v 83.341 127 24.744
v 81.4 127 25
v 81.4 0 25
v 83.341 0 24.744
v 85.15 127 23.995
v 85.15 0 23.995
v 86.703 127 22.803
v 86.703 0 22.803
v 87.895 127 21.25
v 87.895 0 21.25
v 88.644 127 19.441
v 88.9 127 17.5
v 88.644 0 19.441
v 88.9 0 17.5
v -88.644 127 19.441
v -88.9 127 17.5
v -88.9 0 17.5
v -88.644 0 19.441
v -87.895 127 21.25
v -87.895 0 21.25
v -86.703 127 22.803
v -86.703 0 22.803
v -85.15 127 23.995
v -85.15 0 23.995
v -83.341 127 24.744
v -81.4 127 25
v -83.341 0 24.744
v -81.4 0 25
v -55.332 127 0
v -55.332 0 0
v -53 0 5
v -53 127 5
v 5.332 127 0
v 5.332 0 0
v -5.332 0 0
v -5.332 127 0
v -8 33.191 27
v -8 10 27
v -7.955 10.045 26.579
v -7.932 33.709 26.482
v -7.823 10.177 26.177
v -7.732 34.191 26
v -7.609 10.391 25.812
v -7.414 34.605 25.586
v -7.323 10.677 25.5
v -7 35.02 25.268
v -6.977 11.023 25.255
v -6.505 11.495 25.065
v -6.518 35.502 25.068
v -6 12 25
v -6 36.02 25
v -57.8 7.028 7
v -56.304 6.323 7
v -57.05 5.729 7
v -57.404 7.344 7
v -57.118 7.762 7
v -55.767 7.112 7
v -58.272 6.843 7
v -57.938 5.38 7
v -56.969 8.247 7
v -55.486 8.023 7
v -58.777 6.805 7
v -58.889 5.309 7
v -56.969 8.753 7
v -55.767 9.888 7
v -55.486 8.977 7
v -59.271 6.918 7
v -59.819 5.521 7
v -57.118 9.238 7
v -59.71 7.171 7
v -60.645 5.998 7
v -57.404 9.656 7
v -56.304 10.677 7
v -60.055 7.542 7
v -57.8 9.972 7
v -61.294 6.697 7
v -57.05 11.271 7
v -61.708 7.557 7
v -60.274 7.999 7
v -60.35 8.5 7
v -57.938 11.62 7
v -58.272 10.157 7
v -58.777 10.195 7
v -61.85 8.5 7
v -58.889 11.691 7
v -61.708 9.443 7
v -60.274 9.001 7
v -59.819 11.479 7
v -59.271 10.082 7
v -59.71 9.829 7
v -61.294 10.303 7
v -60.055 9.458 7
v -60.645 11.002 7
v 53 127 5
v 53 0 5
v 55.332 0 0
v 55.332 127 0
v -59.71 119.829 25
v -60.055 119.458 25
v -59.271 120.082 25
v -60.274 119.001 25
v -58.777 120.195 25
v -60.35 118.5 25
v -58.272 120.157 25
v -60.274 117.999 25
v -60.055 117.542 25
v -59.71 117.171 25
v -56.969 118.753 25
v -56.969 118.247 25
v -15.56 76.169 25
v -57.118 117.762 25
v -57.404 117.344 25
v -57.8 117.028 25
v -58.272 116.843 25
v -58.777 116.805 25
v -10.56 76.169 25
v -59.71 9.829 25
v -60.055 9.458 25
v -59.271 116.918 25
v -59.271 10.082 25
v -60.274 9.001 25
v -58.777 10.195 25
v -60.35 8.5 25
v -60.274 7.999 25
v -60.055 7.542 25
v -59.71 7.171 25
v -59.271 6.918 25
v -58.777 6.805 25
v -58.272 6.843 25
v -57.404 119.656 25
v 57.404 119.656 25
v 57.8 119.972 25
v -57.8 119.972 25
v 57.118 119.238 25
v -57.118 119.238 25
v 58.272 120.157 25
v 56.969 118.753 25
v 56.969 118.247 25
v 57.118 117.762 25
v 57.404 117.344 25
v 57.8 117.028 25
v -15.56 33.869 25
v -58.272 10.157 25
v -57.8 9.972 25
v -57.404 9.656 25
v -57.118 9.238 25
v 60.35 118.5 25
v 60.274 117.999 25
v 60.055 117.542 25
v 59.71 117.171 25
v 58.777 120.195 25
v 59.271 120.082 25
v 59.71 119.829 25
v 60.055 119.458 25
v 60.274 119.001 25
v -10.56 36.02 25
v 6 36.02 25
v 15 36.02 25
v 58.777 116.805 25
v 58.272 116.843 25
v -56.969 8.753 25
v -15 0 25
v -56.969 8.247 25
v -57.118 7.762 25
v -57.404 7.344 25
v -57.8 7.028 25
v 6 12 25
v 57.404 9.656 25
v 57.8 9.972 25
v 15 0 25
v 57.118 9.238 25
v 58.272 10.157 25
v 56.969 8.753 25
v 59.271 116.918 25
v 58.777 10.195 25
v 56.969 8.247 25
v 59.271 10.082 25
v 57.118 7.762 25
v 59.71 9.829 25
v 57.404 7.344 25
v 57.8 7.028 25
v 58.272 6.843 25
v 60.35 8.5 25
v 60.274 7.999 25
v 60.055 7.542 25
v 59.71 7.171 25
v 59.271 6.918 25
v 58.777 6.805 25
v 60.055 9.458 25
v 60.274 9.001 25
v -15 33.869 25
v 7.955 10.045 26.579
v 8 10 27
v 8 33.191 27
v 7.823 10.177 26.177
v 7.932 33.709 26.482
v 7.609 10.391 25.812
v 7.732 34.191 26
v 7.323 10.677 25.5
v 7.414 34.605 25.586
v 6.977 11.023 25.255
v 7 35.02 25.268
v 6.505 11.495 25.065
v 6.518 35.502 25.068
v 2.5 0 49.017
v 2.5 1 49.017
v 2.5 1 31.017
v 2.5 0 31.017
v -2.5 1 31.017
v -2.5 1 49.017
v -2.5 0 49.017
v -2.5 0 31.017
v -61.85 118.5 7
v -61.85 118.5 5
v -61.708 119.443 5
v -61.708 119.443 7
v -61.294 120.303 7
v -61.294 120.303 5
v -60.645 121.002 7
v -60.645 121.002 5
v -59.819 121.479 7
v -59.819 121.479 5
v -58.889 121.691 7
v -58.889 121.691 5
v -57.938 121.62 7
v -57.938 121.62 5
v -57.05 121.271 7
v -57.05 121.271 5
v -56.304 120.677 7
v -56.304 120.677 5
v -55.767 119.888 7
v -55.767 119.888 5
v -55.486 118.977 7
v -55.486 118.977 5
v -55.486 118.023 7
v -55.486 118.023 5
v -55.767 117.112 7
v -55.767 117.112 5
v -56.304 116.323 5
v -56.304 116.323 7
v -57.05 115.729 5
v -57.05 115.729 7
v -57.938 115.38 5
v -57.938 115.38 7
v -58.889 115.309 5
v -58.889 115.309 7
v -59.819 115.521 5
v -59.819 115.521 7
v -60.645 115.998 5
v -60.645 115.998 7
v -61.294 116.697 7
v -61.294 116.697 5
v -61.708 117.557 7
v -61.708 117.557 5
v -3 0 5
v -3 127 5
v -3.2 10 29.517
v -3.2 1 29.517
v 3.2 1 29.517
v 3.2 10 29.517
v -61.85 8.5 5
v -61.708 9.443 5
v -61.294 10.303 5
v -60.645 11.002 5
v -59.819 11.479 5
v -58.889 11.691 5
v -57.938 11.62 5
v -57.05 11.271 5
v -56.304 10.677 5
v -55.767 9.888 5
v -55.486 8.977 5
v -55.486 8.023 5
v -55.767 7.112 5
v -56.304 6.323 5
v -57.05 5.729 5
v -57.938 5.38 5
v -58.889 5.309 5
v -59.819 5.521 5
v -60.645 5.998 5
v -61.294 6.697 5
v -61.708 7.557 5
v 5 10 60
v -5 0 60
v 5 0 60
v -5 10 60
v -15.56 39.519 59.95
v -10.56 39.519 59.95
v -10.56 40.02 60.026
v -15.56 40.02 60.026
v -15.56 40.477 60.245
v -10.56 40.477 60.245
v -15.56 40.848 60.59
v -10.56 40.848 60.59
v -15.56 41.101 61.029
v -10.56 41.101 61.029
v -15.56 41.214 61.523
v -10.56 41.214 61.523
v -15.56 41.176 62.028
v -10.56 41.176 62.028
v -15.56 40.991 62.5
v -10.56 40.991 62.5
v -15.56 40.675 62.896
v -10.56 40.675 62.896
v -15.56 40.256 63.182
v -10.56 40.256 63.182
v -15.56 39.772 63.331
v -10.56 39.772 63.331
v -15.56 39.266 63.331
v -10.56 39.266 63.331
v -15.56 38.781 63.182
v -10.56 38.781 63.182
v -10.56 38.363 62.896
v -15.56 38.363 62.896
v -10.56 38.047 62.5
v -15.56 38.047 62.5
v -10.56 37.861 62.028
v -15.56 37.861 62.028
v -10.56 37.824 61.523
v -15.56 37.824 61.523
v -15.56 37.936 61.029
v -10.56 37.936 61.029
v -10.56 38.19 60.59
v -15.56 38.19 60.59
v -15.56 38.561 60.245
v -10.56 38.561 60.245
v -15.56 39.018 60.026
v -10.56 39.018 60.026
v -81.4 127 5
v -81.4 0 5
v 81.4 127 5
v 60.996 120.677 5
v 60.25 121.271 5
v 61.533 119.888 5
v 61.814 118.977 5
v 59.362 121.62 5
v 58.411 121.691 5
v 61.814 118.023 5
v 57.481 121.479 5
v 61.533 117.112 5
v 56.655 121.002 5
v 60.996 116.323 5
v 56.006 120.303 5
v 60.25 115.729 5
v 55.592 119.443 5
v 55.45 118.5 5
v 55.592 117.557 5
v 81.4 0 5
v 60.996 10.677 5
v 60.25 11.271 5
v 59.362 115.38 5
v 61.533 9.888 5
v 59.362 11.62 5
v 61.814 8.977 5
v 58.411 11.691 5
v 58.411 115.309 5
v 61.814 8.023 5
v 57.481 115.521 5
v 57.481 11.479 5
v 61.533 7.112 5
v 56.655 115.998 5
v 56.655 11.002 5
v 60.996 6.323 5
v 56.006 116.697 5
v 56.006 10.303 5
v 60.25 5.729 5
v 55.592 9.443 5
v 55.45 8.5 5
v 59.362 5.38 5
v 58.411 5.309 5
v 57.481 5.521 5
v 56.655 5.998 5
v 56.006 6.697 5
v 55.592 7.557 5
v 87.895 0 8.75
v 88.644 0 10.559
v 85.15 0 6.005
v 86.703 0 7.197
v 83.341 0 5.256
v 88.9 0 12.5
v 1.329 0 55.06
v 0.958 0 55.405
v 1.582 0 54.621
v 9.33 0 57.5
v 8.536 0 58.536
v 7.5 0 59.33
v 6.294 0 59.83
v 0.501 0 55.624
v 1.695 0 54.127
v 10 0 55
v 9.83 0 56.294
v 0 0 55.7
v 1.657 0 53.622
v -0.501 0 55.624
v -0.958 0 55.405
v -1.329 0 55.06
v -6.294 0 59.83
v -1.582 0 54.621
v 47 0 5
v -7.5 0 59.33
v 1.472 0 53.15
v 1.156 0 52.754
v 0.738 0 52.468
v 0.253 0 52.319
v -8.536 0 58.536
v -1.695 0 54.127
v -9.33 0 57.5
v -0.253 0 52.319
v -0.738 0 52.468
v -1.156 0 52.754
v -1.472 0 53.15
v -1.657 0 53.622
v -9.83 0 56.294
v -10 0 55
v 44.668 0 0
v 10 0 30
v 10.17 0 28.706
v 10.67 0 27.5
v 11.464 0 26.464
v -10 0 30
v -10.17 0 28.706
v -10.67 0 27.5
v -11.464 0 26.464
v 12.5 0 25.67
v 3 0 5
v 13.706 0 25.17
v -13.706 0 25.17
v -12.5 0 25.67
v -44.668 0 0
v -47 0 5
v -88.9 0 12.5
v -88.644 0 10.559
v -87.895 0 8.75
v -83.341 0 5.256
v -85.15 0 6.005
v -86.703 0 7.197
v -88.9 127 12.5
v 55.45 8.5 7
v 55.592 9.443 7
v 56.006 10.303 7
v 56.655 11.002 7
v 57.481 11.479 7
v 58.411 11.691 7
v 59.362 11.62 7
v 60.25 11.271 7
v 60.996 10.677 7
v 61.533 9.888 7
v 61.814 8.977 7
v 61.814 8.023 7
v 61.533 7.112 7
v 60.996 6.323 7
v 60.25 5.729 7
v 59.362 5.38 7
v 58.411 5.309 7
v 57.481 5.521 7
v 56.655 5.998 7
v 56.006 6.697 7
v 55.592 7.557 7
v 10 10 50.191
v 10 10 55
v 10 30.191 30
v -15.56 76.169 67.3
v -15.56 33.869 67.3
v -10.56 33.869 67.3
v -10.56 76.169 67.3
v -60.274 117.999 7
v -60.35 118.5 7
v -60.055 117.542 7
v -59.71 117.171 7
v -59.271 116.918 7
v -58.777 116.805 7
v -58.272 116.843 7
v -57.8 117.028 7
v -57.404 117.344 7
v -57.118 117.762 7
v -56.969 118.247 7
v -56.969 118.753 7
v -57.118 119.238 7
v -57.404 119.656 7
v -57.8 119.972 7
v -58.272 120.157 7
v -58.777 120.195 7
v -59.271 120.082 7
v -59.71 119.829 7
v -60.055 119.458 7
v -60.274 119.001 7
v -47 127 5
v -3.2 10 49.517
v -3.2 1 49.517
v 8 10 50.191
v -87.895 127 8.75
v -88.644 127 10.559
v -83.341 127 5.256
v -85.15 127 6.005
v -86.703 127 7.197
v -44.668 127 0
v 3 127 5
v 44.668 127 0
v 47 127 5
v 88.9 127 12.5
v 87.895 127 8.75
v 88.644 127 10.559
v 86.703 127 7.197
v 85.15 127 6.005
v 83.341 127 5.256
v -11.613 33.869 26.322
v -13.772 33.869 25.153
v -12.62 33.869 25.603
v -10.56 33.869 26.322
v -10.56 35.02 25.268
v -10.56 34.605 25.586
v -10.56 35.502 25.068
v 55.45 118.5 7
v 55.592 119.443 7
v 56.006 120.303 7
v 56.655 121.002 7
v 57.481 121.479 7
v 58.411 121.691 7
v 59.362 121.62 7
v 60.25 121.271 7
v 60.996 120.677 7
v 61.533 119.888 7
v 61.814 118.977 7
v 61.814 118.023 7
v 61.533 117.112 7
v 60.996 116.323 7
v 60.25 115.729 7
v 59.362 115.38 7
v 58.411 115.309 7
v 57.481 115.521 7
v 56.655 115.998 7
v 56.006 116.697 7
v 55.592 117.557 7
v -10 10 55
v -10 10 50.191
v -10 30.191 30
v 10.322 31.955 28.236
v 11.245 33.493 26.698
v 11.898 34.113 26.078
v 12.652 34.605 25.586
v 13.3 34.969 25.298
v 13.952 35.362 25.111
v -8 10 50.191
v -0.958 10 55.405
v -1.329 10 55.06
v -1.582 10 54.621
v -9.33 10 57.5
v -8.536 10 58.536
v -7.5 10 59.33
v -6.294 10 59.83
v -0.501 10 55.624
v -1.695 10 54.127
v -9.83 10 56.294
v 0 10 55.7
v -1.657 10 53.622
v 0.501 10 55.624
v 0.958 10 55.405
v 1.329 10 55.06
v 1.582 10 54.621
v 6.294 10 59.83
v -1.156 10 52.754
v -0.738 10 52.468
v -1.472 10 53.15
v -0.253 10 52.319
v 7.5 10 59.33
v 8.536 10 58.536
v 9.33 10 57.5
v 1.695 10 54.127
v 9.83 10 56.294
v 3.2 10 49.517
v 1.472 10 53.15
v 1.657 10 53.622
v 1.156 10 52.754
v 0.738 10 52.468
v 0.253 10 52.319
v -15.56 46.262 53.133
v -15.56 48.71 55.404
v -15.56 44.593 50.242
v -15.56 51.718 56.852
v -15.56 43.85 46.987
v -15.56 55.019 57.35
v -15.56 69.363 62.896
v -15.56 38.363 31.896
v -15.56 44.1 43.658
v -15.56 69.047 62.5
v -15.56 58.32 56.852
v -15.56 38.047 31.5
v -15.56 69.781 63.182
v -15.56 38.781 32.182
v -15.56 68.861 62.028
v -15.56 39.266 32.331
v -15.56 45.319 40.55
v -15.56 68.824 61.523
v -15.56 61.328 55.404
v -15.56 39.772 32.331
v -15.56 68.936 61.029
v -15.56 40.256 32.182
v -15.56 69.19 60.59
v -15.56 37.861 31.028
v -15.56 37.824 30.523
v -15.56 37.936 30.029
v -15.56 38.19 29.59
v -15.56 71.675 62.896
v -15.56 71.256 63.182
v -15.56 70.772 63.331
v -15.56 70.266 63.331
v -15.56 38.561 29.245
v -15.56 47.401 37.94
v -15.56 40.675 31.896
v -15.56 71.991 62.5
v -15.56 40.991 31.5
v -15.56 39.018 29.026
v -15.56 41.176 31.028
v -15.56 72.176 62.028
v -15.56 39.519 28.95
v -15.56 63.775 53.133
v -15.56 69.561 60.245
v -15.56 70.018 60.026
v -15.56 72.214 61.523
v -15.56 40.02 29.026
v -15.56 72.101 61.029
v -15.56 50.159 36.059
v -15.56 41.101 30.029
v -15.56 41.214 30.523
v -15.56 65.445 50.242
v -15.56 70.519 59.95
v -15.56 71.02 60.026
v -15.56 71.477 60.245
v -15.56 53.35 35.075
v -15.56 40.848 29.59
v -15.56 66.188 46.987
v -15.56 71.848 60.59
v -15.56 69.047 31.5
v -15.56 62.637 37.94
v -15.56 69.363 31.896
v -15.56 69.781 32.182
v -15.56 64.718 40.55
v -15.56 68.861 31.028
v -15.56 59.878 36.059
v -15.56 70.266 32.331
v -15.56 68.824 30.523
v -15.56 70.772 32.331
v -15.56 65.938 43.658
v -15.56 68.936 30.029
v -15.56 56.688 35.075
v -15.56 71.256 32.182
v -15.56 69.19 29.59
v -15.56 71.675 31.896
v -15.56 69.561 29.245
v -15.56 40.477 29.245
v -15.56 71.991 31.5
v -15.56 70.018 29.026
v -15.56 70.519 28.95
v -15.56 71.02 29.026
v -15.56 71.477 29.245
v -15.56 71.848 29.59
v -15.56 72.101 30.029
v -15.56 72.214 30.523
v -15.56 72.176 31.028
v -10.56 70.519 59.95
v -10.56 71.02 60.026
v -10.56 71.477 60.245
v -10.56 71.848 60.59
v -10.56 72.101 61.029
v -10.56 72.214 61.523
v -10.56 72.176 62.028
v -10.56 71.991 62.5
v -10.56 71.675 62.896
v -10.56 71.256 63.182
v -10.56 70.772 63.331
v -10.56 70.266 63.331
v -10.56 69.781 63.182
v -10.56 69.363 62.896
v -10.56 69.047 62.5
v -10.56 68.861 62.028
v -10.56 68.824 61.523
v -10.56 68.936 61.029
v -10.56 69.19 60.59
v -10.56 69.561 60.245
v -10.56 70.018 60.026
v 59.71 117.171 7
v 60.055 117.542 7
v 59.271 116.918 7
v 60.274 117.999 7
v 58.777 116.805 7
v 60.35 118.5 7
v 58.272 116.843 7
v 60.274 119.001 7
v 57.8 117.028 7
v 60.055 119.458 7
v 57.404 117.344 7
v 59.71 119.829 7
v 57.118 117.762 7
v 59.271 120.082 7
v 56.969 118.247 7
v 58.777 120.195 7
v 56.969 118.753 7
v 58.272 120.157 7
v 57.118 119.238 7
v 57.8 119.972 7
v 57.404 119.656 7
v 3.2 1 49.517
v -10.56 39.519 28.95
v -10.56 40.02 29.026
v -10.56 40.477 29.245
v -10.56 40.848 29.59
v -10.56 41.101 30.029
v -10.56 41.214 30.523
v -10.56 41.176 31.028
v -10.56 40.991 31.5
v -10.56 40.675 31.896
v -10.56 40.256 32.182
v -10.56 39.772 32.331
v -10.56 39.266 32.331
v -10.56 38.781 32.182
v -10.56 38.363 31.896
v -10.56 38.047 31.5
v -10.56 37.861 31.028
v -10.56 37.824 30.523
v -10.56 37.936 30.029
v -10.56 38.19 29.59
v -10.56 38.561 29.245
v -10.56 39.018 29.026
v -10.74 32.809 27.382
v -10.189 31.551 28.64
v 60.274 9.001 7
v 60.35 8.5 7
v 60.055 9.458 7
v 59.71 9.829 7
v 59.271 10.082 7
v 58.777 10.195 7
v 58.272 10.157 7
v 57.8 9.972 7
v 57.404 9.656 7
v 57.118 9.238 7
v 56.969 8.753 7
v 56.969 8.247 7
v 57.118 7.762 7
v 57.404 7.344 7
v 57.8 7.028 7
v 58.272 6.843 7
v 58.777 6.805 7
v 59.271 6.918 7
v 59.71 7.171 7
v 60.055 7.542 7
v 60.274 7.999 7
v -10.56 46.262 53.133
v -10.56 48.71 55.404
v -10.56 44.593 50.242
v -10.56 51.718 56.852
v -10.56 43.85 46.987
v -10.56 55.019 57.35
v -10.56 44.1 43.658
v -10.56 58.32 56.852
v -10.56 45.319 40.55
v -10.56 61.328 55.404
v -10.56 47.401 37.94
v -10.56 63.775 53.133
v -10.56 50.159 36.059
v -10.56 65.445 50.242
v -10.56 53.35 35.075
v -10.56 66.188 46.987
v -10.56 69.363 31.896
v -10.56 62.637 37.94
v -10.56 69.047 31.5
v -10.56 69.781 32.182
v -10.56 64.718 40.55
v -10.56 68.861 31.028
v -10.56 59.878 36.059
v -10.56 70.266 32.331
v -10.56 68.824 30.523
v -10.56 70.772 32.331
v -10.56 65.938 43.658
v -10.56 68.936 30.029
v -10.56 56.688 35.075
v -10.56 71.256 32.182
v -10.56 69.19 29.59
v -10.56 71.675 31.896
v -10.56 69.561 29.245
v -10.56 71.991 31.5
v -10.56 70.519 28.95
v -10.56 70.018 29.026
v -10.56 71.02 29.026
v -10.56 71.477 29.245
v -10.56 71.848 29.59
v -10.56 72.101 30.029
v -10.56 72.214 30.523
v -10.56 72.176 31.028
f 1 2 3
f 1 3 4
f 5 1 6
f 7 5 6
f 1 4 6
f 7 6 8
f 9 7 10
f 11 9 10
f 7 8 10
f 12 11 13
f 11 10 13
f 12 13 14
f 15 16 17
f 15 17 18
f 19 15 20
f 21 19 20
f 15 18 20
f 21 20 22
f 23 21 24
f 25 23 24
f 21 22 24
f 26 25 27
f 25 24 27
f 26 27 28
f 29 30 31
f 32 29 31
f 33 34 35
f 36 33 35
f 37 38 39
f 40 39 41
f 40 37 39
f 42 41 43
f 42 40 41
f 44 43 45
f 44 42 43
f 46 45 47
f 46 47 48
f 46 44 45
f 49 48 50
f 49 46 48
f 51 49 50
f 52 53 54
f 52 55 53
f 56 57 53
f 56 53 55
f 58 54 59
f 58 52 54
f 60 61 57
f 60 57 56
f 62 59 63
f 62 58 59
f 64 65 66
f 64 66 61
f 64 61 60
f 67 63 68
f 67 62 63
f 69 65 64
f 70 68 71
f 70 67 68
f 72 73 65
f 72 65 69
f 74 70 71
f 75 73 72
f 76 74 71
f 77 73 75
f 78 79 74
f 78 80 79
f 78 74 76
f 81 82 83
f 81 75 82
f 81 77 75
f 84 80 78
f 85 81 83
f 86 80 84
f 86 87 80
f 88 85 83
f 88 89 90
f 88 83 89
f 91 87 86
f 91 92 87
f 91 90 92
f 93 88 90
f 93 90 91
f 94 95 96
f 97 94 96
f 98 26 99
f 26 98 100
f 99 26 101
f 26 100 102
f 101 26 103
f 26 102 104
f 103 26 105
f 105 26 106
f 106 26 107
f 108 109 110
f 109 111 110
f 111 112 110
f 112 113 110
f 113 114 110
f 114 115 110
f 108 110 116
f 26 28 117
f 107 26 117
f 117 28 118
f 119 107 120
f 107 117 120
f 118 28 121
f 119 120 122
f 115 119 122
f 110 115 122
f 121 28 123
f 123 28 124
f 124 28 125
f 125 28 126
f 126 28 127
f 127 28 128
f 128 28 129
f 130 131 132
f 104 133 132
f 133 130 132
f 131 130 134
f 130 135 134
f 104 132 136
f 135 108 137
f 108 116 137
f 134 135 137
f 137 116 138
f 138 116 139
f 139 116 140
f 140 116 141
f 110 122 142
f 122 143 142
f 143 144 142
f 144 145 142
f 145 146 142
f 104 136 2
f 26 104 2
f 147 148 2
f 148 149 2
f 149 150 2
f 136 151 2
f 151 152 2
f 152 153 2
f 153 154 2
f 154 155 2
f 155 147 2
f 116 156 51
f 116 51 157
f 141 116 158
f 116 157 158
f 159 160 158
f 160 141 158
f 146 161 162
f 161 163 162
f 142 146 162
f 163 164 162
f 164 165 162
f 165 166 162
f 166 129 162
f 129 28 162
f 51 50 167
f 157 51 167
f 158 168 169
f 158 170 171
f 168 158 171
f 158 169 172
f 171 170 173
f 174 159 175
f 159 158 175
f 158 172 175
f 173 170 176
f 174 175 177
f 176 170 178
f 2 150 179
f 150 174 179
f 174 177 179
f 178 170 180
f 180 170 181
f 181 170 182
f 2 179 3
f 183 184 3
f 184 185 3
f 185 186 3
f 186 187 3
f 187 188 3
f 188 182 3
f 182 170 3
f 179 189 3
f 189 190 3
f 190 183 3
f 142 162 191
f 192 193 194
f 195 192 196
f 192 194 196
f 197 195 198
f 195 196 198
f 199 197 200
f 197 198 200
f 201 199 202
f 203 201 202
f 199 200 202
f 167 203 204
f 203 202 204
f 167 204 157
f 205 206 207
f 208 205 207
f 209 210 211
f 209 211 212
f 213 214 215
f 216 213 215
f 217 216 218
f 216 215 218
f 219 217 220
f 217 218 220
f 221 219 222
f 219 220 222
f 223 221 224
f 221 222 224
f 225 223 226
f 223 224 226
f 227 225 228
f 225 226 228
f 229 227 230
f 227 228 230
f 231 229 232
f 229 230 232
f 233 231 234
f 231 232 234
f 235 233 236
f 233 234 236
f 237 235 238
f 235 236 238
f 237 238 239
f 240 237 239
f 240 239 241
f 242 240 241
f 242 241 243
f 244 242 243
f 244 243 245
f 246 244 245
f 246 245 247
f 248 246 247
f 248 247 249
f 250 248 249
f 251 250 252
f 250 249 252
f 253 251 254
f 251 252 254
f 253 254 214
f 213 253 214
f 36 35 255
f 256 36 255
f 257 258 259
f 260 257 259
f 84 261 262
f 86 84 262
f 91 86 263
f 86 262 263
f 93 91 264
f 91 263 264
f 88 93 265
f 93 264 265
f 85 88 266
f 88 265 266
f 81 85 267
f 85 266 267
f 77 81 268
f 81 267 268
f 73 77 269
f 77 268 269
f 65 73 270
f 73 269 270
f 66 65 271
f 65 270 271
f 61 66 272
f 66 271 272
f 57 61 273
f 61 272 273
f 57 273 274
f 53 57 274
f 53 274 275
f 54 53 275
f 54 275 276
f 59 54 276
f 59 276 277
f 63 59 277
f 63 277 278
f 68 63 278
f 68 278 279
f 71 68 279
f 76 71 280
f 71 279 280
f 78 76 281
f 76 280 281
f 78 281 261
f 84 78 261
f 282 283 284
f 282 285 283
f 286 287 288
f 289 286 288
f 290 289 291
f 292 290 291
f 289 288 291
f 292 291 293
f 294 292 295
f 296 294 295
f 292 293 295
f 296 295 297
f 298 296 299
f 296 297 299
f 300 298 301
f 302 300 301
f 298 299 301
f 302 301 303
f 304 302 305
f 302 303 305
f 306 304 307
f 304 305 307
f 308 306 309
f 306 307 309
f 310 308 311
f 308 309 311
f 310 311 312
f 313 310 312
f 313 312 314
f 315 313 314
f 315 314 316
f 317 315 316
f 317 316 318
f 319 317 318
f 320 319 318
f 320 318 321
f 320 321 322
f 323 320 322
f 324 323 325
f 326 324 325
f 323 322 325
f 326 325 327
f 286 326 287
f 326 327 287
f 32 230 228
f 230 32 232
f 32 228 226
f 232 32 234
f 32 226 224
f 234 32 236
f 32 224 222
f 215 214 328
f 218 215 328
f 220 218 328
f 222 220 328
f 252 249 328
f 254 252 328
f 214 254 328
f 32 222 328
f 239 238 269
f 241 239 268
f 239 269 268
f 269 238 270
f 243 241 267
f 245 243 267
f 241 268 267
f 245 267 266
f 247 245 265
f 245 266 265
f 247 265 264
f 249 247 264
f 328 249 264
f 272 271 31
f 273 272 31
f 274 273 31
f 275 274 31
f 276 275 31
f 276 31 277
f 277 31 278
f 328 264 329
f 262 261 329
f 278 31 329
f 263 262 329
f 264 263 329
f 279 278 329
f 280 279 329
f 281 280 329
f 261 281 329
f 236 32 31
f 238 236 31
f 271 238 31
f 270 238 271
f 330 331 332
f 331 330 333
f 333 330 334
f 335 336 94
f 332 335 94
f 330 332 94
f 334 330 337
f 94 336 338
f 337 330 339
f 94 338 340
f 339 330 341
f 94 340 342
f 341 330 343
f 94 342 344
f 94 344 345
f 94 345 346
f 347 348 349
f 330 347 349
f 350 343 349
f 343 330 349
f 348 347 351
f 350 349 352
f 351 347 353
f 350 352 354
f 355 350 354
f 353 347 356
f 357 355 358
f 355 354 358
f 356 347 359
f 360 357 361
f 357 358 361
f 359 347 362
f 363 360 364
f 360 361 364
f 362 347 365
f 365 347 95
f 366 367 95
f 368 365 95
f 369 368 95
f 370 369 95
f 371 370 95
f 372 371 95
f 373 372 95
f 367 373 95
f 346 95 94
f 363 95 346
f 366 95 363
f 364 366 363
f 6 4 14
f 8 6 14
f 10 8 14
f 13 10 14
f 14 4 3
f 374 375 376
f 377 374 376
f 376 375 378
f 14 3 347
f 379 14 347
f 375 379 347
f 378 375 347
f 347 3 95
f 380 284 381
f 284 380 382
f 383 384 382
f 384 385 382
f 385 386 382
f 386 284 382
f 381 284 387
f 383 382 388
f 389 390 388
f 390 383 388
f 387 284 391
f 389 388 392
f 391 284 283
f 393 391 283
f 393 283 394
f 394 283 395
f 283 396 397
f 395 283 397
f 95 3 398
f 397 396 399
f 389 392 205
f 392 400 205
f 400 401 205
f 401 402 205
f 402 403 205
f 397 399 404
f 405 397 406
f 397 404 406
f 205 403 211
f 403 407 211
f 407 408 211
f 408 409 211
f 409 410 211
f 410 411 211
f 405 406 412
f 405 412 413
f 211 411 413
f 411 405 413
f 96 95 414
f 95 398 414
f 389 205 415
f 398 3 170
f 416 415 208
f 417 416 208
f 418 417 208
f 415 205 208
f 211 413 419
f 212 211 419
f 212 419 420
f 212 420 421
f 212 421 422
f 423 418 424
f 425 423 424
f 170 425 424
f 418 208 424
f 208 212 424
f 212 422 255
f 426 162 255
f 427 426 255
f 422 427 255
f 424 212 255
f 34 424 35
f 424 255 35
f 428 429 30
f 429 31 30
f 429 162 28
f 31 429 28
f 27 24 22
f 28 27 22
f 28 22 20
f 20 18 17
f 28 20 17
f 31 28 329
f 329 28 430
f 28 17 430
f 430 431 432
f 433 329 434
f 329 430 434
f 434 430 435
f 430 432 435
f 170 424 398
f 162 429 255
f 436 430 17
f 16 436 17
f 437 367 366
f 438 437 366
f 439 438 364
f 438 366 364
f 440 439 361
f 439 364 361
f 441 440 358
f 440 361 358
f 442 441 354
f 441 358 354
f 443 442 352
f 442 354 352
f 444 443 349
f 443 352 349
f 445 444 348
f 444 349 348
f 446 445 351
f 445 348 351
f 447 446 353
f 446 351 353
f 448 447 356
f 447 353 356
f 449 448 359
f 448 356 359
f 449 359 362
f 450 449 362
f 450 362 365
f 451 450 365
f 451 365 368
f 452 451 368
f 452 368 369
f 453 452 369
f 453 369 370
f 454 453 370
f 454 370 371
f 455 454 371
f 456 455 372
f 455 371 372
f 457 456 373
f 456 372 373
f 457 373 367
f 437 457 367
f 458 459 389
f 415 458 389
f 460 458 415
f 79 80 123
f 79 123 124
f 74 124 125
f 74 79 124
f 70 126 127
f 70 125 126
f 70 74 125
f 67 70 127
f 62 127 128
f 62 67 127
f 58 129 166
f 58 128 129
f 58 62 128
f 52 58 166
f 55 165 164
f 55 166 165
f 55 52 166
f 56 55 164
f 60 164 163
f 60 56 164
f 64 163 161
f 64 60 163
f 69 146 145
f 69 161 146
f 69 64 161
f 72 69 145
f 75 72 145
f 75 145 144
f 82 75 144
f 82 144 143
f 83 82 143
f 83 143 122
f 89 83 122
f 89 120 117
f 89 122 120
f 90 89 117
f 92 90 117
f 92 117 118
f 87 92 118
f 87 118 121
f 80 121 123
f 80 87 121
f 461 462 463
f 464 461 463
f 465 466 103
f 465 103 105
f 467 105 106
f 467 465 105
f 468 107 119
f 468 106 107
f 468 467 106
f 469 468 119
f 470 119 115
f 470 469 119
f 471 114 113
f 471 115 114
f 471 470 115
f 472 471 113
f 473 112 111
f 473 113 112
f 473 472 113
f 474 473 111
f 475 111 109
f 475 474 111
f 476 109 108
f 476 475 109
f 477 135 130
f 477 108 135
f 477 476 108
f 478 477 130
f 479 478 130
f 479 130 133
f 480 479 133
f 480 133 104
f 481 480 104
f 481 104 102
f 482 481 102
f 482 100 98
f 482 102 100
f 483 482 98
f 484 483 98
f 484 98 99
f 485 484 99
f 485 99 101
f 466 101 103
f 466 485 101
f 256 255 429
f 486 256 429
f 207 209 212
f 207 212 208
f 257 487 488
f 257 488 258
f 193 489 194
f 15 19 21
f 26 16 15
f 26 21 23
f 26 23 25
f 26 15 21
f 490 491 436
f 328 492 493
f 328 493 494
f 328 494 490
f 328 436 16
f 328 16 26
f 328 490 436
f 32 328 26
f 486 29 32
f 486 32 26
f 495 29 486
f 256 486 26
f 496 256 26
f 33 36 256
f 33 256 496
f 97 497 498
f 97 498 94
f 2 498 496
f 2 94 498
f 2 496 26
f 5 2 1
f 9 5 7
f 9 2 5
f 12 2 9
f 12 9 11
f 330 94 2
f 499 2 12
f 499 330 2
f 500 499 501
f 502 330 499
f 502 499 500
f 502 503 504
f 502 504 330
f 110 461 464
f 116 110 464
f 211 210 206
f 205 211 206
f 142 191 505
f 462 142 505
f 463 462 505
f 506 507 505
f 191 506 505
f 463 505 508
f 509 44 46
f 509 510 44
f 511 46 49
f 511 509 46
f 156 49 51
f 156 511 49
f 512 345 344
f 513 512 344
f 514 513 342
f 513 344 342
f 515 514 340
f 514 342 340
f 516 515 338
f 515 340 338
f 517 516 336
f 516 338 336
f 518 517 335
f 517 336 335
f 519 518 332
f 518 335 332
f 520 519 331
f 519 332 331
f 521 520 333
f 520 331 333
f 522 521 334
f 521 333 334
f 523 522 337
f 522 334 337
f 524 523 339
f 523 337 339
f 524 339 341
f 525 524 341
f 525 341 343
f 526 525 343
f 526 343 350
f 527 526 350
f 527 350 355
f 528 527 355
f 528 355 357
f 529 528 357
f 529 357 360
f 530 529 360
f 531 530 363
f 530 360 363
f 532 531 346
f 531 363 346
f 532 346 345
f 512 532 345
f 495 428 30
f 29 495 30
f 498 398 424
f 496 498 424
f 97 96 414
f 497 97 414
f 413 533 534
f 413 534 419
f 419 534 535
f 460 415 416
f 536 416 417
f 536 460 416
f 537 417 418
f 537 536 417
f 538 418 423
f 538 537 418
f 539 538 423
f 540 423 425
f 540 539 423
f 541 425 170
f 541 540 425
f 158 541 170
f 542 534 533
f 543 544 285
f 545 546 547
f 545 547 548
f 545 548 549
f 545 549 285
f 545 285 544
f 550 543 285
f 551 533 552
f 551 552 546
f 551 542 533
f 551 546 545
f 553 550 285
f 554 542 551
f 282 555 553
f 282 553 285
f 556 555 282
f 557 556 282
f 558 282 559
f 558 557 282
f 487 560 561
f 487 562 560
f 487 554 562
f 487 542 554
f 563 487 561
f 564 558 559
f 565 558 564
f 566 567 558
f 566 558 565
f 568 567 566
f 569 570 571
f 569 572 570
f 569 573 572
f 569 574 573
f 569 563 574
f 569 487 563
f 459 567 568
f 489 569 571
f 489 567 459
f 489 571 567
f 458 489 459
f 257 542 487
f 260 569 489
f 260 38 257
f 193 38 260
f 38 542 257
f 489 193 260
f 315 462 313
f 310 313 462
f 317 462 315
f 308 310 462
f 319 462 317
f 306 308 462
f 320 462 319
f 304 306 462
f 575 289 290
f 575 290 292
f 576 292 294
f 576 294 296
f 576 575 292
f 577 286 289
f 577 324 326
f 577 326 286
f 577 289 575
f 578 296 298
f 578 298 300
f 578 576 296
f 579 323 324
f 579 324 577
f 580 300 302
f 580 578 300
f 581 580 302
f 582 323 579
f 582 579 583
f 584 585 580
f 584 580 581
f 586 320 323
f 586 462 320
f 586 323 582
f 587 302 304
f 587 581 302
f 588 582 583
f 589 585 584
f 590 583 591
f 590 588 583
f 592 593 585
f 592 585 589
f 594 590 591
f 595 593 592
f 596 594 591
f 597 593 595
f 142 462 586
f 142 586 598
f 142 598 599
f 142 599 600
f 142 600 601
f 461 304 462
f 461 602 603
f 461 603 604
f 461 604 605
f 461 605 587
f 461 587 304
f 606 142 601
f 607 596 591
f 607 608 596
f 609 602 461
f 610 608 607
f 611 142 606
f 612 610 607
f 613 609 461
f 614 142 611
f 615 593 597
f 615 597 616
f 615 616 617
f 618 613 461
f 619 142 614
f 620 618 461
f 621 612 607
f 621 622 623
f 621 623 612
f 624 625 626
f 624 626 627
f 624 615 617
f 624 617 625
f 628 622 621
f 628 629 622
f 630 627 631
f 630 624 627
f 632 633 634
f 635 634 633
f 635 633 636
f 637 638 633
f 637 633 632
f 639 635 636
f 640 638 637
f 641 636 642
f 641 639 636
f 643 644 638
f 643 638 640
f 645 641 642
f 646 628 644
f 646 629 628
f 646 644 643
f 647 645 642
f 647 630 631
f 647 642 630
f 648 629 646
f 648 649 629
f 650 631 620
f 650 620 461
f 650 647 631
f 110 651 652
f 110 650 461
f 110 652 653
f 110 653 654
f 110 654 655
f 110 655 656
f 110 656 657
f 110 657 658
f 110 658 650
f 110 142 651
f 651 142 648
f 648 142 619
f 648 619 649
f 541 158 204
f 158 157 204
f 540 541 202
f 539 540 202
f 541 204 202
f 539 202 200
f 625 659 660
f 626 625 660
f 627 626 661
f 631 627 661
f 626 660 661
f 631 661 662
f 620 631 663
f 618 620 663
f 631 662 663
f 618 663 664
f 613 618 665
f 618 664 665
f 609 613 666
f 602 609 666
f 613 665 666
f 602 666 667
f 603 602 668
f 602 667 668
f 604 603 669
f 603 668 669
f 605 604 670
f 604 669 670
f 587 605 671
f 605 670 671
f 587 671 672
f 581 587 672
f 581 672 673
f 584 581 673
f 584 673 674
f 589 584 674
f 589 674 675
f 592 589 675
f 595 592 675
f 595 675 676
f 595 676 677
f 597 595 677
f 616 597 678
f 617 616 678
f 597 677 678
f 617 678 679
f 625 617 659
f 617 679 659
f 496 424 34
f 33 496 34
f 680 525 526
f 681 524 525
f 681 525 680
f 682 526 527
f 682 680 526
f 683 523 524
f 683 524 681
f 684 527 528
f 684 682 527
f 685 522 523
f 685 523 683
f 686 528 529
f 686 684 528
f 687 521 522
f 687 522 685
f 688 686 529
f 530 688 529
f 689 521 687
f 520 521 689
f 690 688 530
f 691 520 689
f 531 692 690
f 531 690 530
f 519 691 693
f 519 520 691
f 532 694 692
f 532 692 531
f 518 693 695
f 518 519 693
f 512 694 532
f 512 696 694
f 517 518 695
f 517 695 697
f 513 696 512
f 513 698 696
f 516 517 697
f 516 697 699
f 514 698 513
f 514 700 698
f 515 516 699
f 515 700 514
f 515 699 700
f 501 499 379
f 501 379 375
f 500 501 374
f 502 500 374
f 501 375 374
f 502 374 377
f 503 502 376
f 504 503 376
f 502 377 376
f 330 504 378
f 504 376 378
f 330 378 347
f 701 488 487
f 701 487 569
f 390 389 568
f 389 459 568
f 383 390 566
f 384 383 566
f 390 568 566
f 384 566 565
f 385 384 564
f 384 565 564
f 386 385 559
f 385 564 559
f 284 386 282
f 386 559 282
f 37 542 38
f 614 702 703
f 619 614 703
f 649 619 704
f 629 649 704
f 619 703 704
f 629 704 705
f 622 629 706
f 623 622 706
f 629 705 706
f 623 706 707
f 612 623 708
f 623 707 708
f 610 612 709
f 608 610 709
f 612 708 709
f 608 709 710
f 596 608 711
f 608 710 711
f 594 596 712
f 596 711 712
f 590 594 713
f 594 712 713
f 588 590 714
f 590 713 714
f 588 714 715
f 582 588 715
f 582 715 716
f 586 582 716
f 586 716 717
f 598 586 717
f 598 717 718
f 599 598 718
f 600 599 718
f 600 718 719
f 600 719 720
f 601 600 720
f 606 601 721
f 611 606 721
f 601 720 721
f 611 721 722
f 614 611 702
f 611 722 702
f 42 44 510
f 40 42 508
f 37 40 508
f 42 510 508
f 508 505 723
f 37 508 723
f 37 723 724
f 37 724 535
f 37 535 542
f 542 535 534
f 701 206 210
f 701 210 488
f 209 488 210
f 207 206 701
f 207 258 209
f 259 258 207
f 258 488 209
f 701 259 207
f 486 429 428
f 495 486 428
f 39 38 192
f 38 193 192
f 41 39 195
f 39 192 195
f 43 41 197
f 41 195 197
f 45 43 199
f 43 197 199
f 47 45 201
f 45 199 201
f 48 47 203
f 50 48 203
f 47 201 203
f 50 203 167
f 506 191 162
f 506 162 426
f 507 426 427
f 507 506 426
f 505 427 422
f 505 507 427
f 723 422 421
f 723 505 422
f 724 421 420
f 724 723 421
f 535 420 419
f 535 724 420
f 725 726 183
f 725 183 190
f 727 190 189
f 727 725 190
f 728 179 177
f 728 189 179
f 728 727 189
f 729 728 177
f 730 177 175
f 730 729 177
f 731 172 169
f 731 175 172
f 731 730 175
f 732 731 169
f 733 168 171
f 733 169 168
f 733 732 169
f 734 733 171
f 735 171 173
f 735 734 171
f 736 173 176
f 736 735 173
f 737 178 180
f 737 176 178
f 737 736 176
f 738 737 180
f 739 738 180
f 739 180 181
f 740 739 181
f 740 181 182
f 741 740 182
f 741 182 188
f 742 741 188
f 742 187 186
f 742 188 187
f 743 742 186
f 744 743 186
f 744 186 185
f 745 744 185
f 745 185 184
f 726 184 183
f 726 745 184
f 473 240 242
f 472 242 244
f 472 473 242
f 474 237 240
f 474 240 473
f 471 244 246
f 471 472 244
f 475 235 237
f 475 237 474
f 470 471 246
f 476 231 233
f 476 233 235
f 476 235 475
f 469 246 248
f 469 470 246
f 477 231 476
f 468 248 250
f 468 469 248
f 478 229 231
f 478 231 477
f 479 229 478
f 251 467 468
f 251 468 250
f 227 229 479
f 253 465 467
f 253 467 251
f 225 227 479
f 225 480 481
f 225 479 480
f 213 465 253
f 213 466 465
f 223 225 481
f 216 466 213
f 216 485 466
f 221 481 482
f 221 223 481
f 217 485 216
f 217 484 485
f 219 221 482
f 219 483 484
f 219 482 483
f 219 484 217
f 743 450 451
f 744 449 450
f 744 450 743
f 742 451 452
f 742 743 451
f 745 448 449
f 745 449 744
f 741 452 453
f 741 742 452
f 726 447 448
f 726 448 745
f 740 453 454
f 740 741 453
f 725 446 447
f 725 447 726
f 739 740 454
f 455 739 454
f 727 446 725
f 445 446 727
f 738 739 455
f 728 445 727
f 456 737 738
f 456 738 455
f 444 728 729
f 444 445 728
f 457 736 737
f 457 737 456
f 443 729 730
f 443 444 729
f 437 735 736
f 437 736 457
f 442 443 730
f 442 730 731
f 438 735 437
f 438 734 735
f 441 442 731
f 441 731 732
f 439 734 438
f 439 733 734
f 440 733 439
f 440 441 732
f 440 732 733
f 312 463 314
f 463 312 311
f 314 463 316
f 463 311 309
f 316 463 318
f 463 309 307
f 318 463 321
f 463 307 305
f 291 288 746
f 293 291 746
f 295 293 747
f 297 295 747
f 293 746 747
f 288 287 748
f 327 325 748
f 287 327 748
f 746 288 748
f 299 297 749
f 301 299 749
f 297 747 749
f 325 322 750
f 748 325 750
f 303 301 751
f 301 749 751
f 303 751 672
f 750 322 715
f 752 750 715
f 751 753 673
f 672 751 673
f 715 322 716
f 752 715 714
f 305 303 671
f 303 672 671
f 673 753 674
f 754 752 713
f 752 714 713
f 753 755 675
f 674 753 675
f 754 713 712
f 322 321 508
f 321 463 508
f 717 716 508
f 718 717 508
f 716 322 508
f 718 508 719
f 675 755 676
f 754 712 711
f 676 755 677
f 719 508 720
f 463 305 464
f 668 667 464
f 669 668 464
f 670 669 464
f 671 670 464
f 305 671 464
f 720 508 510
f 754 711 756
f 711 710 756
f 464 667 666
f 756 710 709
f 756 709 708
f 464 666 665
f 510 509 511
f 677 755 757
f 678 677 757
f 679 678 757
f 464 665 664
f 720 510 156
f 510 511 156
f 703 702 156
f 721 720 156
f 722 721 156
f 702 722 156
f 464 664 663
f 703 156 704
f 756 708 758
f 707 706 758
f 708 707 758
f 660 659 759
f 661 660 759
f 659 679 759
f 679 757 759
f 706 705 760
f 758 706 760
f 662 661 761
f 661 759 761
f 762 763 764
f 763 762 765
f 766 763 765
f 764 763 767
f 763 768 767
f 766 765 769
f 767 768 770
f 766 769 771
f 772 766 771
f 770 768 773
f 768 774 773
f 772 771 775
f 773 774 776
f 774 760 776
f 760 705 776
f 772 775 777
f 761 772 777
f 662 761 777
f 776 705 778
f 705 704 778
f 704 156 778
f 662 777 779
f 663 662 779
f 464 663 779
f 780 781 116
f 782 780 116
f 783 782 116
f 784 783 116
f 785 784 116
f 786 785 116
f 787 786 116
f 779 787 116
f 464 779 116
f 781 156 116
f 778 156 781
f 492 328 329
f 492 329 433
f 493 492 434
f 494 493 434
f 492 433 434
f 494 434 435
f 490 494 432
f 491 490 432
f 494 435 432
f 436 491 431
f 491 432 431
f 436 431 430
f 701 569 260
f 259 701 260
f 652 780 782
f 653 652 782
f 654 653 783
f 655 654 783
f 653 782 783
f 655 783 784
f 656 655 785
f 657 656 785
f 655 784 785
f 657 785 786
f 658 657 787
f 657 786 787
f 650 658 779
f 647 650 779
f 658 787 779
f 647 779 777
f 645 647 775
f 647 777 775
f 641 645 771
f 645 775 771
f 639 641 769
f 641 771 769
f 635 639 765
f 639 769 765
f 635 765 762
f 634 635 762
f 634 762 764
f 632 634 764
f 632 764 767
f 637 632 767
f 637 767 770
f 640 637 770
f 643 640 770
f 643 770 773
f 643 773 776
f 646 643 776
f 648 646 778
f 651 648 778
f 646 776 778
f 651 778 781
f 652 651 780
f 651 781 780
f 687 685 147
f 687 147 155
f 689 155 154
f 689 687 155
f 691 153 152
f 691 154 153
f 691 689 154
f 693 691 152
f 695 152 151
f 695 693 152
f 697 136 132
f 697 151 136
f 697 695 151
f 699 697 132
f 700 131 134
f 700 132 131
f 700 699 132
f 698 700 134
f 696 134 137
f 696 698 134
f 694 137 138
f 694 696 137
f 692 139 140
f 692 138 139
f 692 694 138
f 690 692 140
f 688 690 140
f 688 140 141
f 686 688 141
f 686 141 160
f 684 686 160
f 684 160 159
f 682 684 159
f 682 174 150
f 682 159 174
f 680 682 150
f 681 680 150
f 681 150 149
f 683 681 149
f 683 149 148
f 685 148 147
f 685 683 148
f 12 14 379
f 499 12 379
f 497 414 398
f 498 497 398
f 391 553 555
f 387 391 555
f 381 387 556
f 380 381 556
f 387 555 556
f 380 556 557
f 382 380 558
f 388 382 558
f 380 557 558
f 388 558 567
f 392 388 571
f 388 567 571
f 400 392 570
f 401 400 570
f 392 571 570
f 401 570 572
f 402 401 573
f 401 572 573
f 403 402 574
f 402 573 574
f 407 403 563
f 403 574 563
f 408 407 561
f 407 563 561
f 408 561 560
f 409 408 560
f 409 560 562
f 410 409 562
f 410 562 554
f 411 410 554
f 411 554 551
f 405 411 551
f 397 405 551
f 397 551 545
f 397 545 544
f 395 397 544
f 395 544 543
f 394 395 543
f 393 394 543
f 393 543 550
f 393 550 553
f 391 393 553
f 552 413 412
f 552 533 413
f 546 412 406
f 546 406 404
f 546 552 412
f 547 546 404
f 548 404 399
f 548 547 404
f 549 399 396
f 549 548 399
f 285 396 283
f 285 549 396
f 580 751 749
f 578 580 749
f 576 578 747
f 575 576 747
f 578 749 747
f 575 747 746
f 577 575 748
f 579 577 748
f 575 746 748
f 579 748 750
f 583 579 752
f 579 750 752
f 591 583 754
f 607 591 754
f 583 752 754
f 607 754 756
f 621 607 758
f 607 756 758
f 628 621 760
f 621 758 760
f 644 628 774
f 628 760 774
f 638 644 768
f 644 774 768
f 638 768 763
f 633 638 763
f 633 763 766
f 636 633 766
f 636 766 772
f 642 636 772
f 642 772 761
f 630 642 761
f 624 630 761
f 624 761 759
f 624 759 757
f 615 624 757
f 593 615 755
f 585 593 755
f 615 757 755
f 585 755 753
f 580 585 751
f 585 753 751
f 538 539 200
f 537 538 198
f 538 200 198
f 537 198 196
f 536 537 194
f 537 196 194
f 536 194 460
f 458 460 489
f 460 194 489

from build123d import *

# Parameters (mm, degrees)
BOSS_EXTRUDE1_DEPTH     = 127
SKETCH3_W               = 5
SKETCH3_H               = 42.3
BOSS_EXTRUDE2_DEPTH     = 42.3
SKETCH4_R               = 1.7
CUT_EXTRUDE1_DEPTH      = 5
CUT_EXTRUDE7_DEPTH      = 161.690696682
CUT_EXTRUDE7_DEPTH_BACK = 161.690696682
SKETCH5_R               = 1.7
SKETCH8_R               = 3.2
CUT_EXTRUDE8_DEPTH      = 2
SKETCH10_W              = 20
SKETCH10_H              = 10
BOSS_EXTRUDE3_DEPTH     = 35
FILLET3_R               = 5
SKETCH12_R              = 1.7
CUT_EXTRUDE9_DEPTH      = 35
RIB47_START             = -2
RIB47_DEPTH             = 2
FILLET7_R               = 5
FILLET8_R               = 2
SKETCH18_W              = 6.4
SKETCH18_H              = 20
CUT_EXTRUDE10_DEPTH     = 9
SKETCH19_W              = 5
SKETCH19_H              = 18
CUT_EXTRUDE11_DEPTH     = 4


# Read off the part's stored shape, not the designer's step: Rib47
with BuildPart() as part:
    # Sketch2 → Boss-Extrude1 (new body)
    with BuildSketch(Plane(origin=(0, 0, 0), x_dir=(1, 0, 0), z_dir=(0, 1, 0))):
        with BuildLine():
            Line((-5.331538291, 0), (-3, -5))
            Line((-3, -5), (-47, -5))
            Line((-47, -5), (-44.668461709, 0))
            Line((-44.668461709, 0), (-55.331538291, 0))
            Line((-55.331538291, 0), (-53, -5))
            Line((-53, -5), (-81.4, -5))
            ThreePointArc((-81.4, -5), (-86.703300859, -7.196699141), (-88.9, -12.5))
            Line((-88.9, -12.5), (-88.9, -17.5))
            ThreePointArc((-88.9, -17.5), (-86.703300859, -22.803300859), (-81.4, -25))
            Line((-81.4, -25), (81.4, -25))
            ThreePointArc((81.4, -25), (86.703300859, -22.803300859), (88.9, -17.5))
            Line((88.9, -17.5), (88.9, -12.5))
            ThreePointArc((88.9, -12.5), (86.703300859, -7.196699141), (81.4, -5))
            Line((81.4, -5), (53, -5))
            Line((53, -5), (55.331538291, 0))
            Line((55.331538291, 0), (44.668461709, 0))
            Line((44.668461709, 0), (47, -5))
            Line((47, -5), (3, -5))
            Line((3, -5), (5.331538291, 0))
            Line((5.331538291, 0), (-5.331538291, 0))
        make_face()
    extrude(amount=BOSS_EXTRUDE1_DEPTH)

    # Sketch3 → Boss-Extrude2 (add)
    with BuildSketch(Plane.XY.offset(25)):
        with Locations((-13.06, 55.018873206)):
            Rectangle(SKETCH3_W, SKETCH3_H)
    extrude(amount=BOSS_EXTRUDE2_DEPTH)

    # Sketch4 → Cut-Extrude1 (cut)
    with BuildSketch(Plane(origin=(-10.56, 0, 0), x_dir=(0, 0, -1), z_dir=(1, 0, 0))):
        with BuildLine():
            ThreePointArc((-34.95, 55.018873206), (-46.15, 66.218873206), (-57.35, 55.018873206))
            Line((-57.35, 55.018873206), (-34.95, 55.018873206))
        make_face()
        with BuildLine():
            Line((-34.95, 55.018873206), (-57.35, 55.018873206))
            ThreePointArc((-57.35, 55.018873206), (-46.15, 43.818873206), (-34.95, 55.018873206))
        make_face()
        with Locations((-61.65, 70.518873206)):
            Circle(SKETCH4_R)
        with Locations((-30.65, 70.518873206)):
            Circle(SKETCH4_R)
        with Locations((-30.65, 39.518873206)):
            Circle(SKETCH4_R)
        with Locations((-61.65, 39.518873206)):
            Circle(SKETCH4_R)
    extrude(amount=-CUT_EXTRUDE1_DEPTH, mode=Mode.SUBTRACT)

    # Sketch5 → Cut-Extrude7 (cut, two sides: drawn at the far end of the back side and taken through both)
    with BuildSketch(Plane.XY.offset(25).offset(-CUT_EXTRUDE7_DEPTH_BACK)):
        with Locations(Location((-58.65, 118.5, 0), (0, 0, 180))):
            Circle(SKETCH5_R)
        with Locations((58.65, 118.5)):
            Circle(SKETCH5_R)
        with Locations((58.65, 8.5)):
            Circle(SKETCH5_R)
        with Locations(Location((-58.65, 8.5, 0), (0, 0, 180))):
            Circle(SKETCH5_R)
    extrude(amount=CUT_EXTRUDE7_DEPTH + CUT_EXTRUDE7_DEPTH_BACK, mode=Mode.SUBTRACT)

    # Sketch8 → Cut-Extrude8 (cut)
    with BuildSketch(Plane(origin=(0, 0, 5), x_dir=(-1, 0, 0), z_dir=(0, 0, -1))):
        with Locations((-58.65, 118.5)):
            Circle(SKETCH8_R)
        with Locations((-58.65, 8.5)):
            Circle(SKETCH8_R)
        with Locations((58.65, 118.5)):
            Circle(SKETCH8_R)
        with Locations((58.65, 8.5)):
            Circle(SKETCH8_R)
    extrude(amount=-CUT_EXTRUDE8_DEPTH, mode=Mode.SUBTRACT)

    # Sketch10 → Boss-Extrude3 (add)
    with BuildSketch(Plane.XY.offset(25)):
        with Locations((0, 5)):
            Rectangle(SKETCH10_W, SKETCH10_H)
    extrude(amount=BOSS_EXTRUDE3_DEPTH)

    # Fillet3
    fillet3_edges = [part.edges().sort_by_distance(p)[0] for p in [
        (-10, 5, 60),
        (10, 5, 60),
    ]]
    fillet(fillet3_edges, radius=FILLET3_R)

    # Sketch12 → Cut-Extrude9 (cut)
    with BuildSketch(Plane(origin=(0, 10, 0), x_dir=(1, 0, 0), z_dir=(0, 1, 0))):
        with Locations(Location((0, -54, 0), (0, 0, 270))):
            Circle(SKETCH12_R)
    extrude(amount=-CUT_EXTRUDE9_DEPTH, mode=Mode.SUBTRACT)

    # Rib47 outline → Rib47 (add)
    with BuildSketch(Plane(origin=(10, 0, 0), x_dir=(0, 0, -1), z_dir=(1, 0, 0)).offset(RIB47_START)):
        Polygon((-25, 35.191123447), (-50.191123447, 10), (-25, 10), align=None)
    rib47 = extrude(amount=RIB47_DEPTH)

    # Mirror1: Rib47 across plane
    add(rib47.mirror(Plane(origin=(0, 0, 0), x_dir=(0, 0, 1), z_dir=(1, 0, 0))))

    # Fillet7
    # the kernel refuses this fillet: 5 mm, written as the material it adds along each edge
    with BuildSketch(Plane(origin=(-10, 47.691123447, 25), x_dir=(-1, 0, 0), z_dir=(0, -1, 0))) as fillet7_piece_1_section:
        with BuildLine():
            CenterArc((FILLET7_R, -FILLET7_R), FILLET7_R, 90, 90)
            Line((0, -FILLET7_R), (0, 0))
            Line((0, 0), (FILLET7_R, 0))
        make_face()
    fillet7_piece_1 = extrude(amount=47.691123447, mode=Mode.PRIVATE)
    fillet7_piece_1 = split(fillet7_piece_1, bisect_by=Plane(origin=(-11.152129269, 25.569946894, 34.621176553), z_dir=(0, -0.7071067811865476, -0.7071067811865476)), keep=Keep.TOP, mode=Mode.PRIVATE)
    add(fillet7_piece_1)
    with BuildSketch(Plane(origin=(10, 47.691123447, 25), x_dir=(0, 0, 1), z_dir=(0, -1, 0))) as fillet7_piece_2_section:
        with BuildLine():
            CenterArc((FILLET7_R, -FILLET7_R), FILLET7_R, 90, 90)
            Line((0, -FILLET7_R), (0, 0))
            Line((0, 0), (FILLET7_R, 0))
        make_face()
    fillet7_piece_2 = extrude(amount=47.691123447, mode=Mode.PRIVATE)
    fillet7_piece_2 = split(fillet7_piece_2, bisect_by=Plane(origin=(11.152129269, 25.569946894, 34.621176553), z_dir=(0, -0.7071067811865476, -0.7071067811865476)), keep=Keep.TOP, mode=Mode.PRIVATE)
    add(fillet7_piece_2)

    # Fillet8
    fillet8_edges = [part.edges().sort_by_distance(p)[0] for p in [
        (0, 10, 25),
        (8, 22.595561724, 25),
        (11.5, 35.191123447, 25),
        (-9.28, 35.191123447, 25),
        (-8, 22.595561724, 25),
    ]]
    fillet(fillet8_edges, radius=FILLET8_R)

    # Sketch18 → Cut-Extrude10 (cut)
    with BuildSketch(Plane(origin=(0, 10, 0), x_dir=(1, 0, 0), z_dir=(0, 1, 0))):
        with Locations((0, -39.517084206)):
            Rectangle(SKETCH18_W, SKETCH18_H)
    extrude(amount=-CUT_EXTRUDE10_DEPTH, mode=Mode.SUBTRACT)

    # Sketch19 → Cut-Extrude11 (cut)
    with BuildSketch(Plane(origin=(0, 1, 0), x_dir=(1, 0, 0), z_dir=(0, 1, 0))):
        with Locations((0, -40.017084206)):
            Rectangle(SKETCH19_W, SKETCH19_H)
    extrude(amount=-CUT_EXTRUDE11_DEPTH, mode=Mode.SUBTRACT)


solid = part.part
